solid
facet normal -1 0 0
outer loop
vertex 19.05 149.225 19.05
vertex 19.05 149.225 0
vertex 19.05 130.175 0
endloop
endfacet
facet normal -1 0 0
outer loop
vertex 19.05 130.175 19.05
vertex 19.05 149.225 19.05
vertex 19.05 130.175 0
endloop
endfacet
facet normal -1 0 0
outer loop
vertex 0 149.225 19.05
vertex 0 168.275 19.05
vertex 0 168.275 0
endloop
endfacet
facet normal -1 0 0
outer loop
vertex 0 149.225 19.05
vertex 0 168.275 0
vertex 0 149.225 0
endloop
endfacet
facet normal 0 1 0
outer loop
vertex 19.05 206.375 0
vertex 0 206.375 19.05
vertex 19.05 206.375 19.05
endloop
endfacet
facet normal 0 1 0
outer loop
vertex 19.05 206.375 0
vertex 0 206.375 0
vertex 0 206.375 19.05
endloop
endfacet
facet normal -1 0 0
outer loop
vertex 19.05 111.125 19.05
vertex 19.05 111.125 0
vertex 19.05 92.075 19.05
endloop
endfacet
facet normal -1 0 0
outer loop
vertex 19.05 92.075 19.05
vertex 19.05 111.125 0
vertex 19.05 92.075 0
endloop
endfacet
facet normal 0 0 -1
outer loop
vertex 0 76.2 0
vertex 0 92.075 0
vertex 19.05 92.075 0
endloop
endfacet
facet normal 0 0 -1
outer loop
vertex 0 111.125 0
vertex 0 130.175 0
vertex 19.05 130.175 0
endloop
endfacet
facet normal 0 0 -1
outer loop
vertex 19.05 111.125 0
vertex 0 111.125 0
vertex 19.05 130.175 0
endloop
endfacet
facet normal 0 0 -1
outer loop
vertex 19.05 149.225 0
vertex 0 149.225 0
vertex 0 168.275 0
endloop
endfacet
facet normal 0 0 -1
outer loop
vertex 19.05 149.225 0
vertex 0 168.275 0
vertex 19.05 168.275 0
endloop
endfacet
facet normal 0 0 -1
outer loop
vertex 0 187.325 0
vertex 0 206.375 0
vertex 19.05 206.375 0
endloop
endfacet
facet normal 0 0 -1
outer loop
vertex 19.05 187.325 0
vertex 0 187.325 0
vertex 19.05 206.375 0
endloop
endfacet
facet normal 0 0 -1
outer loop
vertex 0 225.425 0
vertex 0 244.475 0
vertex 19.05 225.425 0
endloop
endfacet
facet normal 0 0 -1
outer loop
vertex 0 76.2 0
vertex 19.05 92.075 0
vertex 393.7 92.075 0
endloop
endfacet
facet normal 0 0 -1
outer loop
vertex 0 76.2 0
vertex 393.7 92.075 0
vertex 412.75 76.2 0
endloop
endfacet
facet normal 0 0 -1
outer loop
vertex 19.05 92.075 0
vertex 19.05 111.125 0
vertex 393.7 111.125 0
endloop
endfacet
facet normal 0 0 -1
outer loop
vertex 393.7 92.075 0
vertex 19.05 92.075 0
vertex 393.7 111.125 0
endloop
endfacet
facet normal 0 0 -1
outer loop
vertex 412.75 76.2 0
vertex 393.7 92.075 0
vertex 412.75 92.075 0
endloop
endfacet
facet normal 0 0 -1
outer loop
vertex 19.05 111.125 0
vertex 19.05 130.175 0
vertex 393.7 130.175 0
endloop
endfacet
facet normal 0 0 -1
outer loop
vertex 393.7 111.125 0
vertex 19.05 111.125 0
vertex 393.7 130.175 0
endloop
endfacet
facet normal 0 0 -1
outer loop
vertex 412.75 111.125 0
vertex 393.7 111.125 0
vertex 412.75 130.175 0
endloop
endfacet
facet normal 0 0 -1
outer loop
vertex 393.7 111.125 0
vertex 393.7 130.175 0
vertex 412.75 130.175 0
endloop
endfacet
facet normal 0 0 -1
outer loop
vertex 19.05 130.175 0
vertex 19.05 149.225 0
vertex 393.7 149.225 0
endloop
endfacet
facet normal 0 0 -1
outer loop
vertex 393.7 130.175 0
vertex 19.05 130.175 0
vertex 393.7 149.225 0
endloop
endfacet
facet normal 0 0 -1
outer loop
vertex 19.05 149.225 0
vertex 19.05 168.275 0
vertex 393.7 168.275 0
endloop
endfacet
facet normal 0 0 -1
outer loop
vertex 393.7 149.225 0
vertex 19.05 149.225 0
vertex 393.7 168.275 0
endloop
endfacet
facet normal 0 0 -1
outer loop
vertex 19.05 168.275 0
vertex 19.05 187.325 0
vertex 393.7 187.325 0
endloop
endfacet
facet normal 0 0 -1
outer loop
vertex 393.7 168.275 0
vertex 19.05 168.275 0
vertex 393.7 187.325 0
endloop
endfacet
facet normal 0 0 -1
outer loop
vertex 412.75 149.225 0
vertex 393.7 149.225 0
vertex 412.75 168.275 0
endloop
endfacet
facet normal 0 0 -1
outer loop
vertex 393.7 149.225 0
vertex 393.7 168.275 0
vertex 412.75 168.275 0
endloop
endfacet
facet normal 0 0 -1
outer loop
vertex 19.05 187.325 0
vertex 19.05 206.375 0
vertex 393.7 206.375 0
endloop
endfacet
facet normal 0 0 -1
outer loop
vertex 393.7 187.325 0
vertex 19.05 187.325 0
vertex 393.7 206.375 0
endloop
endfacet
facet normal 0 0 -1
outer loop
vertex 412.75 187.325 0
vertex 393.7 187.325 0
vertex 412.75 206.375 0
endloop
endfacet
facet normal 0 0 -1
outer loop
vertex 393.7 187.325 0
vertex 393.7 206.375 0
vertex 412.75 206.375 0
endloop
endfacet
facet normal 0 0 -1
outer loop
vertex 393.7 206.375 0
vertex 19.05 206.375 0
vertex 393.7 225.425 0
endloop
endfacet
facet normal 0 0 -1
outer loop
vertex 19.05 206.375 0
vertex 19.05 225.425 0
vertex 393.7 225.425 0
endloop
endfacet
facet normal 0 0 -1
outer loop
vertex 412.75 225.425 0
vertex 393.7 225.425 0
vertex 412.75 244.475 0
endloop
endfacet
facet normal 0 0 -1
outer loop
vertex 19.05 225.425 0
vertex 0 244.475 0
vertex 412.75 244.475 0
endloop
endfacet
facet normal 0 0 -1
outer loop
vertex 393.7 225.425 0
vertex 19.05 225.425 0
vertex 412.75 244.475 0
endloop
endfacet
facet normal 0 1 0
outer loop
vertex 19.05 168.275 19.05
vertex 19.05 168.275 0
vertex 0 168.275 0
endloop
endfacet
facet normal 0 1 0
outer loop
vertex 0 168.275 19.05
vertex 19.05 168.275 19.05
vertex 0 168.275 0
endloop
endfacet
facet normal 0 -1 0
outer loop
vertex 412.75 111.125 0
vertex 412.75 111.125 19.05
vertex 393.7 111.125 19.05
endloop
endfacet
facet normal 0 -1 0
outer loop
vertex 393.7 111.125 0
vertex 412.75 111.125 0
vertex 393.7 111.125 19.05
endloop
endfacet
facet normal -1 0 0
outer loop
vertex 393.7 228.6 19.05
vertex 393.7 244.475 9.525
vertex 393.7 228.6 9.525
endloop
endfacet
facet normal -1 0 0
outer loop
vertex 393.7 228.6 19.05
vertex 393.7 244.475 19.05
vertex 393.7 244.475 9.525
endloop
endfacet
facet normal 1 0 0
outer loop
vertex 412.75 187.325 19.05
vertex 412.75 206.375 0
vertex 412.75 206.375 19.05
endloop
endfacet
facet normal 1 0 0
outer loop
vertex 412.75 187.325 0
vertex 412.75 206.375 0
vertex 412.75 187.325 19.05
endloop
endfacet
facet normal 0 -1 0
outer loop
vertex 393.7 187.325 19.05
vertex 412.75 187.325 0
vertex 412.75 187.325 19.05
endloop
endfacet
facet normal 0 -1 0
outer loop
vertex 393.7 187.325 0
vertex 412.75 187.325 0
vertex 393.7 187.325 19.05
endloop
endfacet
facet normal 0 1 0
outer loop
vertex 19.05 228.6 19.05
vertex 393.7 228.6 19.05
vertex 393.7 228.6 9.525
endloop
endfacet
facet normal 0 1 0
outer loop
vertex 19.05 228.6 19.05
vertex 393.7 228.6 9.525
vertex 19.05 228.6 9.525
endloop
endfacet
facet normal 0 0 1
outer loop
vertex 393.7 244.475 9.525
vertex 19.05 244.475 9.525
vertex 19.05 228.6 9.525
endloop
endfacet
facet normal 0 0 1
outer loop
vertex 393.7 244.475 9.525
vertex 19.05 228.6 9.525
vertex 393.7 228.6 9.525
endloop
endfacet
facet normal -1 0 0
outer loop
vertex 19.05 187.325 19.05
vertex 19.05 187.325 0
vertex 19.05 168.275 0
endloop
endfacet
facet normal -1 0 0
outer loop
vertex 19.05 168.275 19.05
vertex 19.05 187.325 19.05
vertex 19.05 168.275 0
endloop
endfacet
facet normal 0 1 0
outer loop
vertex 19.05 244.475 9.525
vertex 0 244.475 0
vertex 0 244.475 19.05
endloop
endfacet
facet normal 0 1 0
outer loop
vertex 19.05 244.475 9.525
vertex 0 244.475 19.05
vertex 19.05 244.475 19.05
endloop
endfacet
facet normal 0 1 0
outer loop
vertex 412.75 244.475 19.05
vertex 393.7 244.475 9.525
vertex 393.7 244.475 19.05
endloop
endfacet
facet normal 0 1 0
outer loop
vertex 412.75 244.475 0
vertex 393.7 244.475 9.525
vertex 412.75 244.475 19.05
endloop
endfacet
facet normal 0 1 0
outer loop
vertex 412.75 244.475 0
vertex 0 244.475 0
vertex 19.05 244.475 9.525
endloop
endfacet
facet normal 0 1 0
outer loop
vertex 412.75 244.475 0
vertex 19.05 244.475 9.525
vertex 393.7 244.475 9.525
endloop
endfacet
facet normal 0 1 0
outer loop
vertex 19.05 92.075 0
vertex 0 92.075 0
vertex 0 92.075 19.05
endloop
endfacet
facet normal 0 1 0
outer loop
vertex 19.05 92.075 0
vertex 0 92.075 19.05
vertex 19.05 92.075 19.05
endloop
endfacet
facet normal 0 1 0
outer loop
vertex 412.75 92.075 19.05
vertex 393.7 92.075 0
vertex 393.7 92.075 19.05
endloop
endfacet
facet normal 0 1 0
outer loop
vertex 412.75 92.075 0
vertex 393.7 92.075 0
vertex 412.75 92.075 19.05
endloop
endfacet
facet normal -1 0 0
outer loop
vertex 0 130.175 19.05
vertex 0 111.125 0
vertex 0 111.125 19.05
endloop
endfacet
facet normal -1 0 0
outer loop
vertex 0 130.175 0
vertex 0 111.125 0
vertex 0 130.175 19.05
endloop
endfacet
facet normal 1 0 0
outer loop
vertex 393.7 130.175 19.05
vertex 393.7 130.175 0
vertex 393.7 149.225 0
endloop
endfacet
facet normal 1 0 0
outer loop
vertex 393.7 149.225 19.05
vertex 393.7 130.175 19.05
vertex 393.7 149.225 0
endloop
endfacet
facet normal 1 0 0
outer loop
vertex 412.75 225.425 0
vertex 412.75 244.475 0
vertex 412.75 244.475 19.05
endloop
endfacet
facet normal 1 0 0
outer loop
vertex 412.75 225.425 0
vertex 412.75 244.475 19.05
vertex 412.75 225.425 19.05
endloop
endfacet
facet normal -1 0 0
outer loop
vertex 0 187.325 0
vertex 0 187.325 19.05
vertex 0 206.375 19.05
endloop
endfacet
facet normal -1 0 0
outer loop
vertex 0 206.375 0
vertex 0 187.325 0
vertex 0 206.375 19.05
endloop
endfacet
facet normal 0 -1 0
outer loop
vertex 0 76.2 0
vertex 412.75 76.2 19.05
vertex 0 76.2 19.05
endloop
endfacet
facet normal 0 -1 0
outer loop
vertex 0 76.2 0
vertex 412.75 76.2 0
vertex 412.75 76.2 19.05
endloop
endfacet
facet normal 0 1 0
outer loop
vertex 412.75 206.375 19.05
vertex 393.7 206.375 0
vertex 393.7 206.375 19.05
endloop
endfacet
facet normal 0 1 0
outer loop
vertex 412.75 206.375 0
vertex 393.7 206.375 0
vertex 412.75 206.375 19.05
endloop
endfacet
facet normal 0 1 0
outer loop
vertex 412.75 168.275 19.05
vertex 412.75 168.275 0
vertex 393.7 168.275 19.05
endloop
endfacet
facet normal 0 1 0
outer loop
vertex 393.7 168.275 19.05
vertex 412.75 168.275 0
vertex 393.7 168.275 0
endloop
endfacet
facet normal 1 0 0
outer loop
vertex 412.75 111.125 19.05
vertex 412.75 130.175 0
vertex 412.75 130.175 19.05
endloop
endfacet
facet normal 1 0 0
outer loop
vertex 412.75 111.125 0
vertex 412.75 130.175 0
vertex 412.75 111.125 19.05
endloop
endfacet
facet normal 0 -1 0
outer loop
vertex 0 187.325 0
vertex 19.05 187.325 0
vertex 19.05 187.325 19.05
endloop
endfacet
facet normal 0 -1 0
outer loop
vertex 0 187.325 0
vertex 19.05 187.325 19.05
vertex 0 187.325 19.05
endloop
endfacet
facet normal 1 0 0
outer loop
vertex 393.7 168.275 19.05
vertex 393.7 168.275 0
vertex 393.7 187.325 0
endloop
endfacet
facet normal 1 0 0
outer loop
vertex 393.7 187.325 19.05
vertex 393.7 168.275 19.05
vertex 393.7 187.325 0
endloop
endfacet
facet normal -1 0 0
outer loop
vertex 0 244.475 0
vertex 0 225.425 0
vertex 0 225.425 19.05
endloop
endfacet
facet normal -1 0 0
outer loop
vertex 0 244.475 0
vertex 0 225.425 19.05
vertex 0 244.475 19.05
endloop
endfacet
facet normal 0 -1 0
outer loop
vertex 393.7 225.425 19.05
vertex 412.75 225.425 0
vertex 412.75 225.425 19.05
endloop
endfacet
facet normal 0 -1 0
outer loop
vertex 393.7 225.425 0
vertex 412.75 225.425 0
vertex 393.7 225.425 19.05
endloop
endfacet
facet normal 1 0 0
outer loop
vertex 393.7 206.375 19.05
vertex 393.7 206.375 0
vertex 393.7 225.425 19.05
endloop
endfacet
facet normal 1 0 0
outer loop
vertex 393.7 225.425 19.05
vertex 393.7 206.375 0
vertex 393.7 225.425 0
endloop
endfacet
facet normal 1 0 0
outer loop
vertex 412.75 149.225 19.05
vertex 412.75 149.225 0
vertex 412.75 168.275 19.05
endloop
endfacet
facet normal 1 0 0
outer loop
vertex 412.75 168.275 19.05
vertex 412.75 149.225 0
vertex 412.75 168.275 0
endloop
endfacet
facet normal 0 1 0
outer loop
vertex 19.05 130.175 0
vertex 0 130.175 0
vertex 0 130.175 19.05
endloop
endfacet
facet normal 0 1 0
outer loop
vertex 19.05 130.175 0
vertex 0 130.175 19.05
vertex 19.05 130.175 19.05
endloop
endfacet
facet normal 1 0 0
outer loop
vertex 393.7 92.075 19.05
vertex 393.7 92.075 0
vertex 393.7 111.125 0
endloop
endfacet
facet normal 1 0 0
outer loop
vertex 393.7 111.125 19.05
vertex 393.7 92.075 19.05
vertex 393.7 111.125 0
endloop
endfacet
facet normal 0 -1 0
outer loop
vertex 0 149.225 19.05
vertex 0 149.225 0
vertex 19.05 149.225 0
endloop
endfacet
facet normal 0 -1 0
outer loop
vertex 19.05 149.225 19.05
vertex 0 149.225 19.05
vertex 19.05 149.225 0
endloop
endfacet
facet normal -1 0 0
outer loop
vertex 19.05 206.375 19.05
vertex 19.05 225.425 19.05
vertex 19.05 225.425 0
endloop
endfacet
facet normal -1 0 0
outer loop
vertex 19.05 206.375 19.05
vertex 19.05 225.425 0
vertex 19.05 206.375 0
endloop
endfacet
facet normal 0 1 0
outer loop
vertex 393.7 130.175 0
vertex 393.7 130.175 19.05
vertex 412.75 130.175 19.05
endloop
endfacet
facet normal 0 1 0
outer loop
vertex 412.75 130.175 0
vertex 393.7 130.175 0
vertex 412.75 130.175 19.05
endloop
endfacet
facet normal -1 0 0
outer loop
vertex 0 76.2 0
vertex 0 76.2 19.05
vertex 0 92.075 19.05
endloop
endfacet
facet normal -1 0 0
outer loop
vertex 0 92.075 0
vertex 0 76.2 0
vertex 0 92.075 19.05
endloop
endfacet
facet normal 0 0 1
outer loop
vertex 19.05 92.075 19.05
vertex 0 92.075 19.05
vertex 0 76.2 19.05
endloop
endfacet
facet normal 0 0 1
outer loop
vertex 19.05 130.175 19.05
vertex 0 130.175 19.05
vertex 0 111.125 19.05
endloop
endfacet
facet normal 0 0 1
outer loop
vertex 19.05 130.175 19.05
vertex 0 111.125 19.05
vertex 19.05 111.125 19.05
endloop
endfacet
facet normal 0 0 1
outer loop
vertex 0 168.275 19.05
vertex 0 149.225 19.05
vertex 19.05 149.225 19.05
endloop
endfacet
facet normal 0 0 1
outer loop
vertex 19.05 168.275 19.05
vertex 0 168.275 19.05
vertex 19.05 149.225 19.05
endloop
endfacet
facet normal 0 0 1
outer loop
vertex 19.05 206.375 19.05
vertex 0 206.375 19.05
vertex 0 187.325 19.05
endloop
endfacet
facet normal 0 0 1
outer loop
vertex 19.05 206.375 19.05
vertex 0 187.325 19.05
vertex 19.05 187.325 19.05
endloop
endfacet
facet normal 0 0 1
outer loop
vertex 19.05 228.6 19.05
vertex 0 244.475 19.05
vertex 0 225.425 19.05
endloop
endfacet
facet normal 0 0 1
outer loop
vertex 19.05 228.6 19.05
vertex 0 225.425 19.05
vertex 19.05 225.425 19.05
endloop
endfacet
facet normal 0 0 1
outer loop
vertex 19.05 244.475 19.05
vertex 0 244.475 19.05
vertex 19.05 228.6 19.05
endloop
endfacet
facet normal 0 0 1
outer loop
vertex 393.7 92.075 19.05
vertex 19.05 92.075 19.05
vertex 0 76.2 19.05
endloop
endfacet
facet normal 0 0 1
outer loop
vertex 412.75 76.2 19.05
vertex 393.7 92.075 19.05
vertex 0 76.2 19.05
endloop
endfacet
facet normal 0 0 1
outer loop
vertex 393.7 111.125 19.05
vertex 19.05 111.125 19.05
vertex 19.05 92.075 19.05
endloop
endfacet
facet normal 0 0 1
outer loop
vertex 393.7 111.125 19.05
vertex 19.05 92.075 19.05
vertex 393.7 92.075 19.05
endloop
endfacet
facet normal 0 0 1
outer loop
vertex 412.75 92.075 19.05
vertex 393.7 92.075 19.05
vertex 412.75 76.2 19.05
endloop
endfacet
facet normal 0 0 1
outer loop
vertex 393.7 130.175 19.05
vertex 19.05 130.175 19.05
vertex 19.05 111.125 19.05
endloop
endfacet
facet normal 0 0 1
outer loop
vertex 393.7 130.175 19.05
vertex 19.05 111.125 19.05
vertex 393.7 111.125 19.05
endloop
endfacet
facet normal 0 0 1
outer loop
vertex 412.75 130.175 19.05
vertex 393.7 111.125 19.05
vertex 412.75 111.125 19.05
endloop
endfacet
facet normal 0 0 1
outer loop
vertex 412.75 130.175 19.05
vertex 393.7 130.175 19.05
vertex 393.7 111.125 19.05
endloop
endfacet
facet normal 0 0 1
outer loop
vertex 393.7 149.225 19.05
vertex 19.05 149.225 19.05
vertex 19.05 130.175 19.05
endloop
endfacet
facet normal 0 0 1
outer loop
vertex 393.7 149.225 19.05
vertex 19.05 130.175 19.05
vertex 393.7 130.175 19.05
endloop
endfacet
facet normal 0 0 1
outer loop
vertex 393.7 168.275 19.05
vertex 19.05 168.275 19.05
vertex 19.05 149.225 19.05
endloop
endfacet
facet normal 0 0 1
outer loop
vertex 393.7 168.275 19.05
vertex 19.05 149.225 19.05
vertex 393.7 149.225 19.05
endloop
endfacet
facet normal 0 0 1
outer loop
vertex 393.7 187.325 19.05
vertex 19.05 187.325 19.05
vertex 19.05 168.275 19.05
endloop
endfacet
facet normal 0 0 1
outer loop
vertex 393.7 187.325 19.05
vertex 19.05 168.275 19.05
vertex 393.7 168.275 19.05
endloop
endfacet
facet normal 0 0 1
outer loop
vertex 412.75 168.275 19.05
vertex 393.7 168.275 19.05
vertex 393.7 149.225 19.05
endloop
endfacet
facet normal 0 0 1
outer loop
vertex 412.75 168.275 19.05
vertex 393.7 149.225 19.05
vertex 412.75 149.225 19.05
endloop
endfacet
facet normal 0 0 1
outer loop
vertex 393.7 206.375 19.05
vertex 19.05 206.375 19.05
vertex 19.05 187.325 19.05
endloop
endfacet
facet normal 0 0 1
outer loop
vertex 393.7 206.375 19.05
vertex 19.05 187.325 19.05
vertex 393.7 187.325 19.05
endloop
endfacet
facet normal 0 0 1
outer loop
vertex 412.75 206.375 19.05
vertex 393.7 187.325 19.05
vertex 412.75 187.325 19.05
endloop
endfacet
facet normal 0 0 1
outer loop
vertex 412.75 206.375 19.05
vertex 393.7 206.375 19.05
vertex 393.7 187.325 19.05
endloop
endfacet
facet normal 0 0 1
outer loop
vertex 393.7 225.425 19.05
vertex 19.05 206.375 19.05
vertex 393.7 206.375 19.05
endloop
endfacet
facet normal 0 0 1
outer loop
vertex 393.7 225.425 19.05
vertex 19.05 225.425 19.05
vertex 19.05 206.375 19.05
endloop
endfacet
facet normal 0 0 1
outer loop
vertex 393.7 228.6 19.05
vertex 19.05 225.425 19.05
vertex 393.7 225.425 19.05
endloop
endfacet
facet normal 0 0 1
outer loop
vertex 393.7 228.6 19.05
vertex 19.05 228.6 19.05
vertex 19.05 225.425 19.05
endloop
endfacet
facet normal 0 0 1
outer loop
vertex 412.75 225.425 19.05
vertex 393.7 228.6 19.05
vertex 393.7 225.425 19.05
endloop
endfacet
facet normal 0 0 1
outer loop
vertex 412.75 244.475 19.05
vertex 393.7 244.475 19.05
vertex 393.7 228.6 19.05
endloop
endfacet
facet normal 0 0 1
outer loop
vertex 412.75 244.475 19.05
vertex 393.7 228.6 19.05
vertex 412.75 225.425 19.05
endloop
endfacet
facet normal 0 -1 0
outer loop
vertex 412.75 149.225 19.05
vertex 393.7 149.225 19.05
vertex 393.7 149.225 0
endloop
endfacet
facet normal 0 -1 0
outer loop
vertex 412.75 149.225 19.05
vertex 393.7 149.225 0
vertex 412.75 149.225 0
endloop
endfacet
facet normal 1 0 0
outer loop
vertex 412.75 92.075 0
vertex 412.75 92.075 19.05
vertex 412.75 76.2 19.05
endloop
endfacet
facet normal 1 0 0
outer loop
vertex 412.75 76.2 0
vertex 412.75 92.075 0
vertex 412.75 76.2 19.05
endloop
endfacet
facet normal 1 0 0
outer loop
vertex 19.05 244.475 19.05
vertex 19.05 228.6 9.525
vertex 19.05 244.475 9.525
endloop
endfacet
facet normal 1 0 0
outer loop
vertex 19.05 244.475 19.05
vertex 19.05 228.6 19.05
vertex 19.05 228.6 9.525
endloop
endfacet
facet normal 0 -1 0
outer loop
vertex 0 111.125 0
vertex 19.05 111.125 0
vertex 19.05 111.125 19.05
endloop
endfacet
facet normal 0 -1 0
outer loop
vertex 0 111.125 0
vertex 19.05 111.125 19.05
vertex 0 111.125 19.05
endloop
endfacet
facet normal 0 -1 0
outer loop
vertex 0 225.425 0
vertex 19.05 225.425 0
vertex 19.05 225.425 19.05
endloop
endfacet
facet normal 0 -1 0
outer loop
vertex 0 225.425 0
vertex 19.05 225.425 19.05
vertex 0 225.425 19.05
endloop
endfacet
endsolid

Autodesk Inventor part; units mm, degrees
ref_plane "YZ Plane" through (0, 0, 0) normal (1, 0, 0) x (0, 1, 0)
ref_plane "XZ Plane" through (0, 0, 0) normal (0, 1, 0) x (-1, 0, 0)
ref_plane "XY Plane" through (0, 0, 0) normal (0, 0, 1) x (1, 0, 0)
sketch "Sketch1" plane through (0, 0, 0) normal (0, 0, 1) x (1, 0, 0)
  line L0 (0, 244.475) -> (19.05, 244.475)
  line L1 (19.05, 244.475) -> (19.05, 225.425)
  line L2 (19.05, 225.425) -> (0, 225.425)
  line L3 (0, 225.425) -> (0, 244.475)
  line L4 (19.05, 168.275) -> (0, 168.275)
  line L5 (0, 168.275) -> (0, 149.225)
  line L6 (0, 149.225) -> (19.05, 149.225)
  line L7 (19.05, 149.225) -> (19.05, 168.275)
  line L8 (0, 130.175) -> (19.05, 130.175)
  line L9 (19.05, 130.175) -> (19.05, 111.125)
  line L10 (19.05, 111.125) -> (0, 111.125)
  line L11 (0, 111.125) -> (0, 130.175)
  line L12 (0, 206.375) -> (19.05, 206.375)
  line L13 (19.05, 206.375) -> (19.05, 187.325)
  line L14 (19.05, 187.325) -> (0, 187.325)
  line L15 (0, 187.325) -> (0, 206.375)
  line L16 (0, 92.075) -> (19.05, 92.075)
  line L17 (19.05, 92.075) -> (19.05, 73.025)
  line L18 (19.05, 73.025) -> (0, 73.025)
  line L19 (0, 73.025) -> (0, 92.075)
  line L20 (0, 53.975) -> (19.05, 53.975)
  line L21 (19.05, 53.975) -> (19.05, 34.925)
  line L22 (19.05, 34.925) -> (0, 34.925)
  line L23 (0, 34.925) -> (0, 53.975)
  line L24 (0, 15.875) -> (19.05, 15.875)
  line L25 (19.05, 15.875) -> (19.05, -3.175)
  line L26 (19.05, -3.175) -> (0, -3.175)
  line L27 (0, -3.175) -> (0, 15.875)
  line L28 (0, 244.475) -> (206.375, 244.475)
  line L29 (206.375, 244.475) -> (206.375, 76.2)
  line L30 (206.375, 76.2) -> (0, 76.2)
  line L31 (19.05, 244.475) -> (19.05, 76.2)
  line L32 (206.375, 244.475) -> (19.05, 244.475)
  line L33 (19.05, 244.475) -> (19.05, 76.2)
  line L34 (19.05, 76.2) -> (206.375, 76.2)
  line L35 (206.375, 76.2) -> (206.375, 244.475)
  line L36 (0, 92.075) -> (19.05, 92.075)
  line L37 (19.05, 92.075) -> (19.05, 76.2)
  line L38 (19.05, 76.2) -> (0, 76.2)
  line L39 (0, 76.2) -> (0, 92.075)
  dimension "d0" = 19.05
  dimension "d1" = 19.05
  dimension "d3" = 19.05
  dimension "d4" = 19.05
  dimension "d5" = 19.05
  dimension "d6" = 19.05
  dimension "d7" = 19.05
  dimension "d8" = 19.05
  dimension "d9" = 19.05
  dimension "d10" = 19.05
  dimension "d11" = 19.05
  dimension "d12" = 19.05
  dimension "d13" = 19.05
  dimension "d14" = 19.05
  dimension "d15" = 19.05
  dimension "d16" = 19.05
  dimension "d17" = 19.05
  dimension "d18" = 19.05
  dimension "d19" = 19.05
  dimension "d21" = 206.375
  dimension "d22" = 168.275
  dimension "d23" = 206.375
extrude "Extrusion3" add sketch "Sketch1" along normal blind 19.05 contours L0 L1 L2 L3 | L28 L29 L30 L17 L31 L9 L7 L13 L1 | L13 L14 L15 L12 | L30 L19 L16 L17 | L7 L6 L5 L4 | L10 L11 L8 L9
mirror "Mirror2" about plane through (206.375, 76.2, 0) normal (1, 0, 0) of "Extrusion3"
sketch "Sketch3" plane through (0, 0, 19.05) normal (0, 0, 1) x (1, 0, 0)
  line L0 (0, 244.475) -> (412.75, 244.475) projected
  line L1 (19.05, 244.475) -> (393.7, 244.475)
  line L2 (393.7, 244.475) -> (393.7, 228.6)
  line L3 (393.7, 228.6) -> (19.05, 228.6)
  line L4 (19.05, 228.6) -> (19.05, 244.475)
  point P0 (0, 0)
  dimension "d33" = 15.875
extrude "Extrusion4" cut sketch "Sketch3" against normal blind 9.525
properties part number "deep_end" material "Wood (Birch)"
